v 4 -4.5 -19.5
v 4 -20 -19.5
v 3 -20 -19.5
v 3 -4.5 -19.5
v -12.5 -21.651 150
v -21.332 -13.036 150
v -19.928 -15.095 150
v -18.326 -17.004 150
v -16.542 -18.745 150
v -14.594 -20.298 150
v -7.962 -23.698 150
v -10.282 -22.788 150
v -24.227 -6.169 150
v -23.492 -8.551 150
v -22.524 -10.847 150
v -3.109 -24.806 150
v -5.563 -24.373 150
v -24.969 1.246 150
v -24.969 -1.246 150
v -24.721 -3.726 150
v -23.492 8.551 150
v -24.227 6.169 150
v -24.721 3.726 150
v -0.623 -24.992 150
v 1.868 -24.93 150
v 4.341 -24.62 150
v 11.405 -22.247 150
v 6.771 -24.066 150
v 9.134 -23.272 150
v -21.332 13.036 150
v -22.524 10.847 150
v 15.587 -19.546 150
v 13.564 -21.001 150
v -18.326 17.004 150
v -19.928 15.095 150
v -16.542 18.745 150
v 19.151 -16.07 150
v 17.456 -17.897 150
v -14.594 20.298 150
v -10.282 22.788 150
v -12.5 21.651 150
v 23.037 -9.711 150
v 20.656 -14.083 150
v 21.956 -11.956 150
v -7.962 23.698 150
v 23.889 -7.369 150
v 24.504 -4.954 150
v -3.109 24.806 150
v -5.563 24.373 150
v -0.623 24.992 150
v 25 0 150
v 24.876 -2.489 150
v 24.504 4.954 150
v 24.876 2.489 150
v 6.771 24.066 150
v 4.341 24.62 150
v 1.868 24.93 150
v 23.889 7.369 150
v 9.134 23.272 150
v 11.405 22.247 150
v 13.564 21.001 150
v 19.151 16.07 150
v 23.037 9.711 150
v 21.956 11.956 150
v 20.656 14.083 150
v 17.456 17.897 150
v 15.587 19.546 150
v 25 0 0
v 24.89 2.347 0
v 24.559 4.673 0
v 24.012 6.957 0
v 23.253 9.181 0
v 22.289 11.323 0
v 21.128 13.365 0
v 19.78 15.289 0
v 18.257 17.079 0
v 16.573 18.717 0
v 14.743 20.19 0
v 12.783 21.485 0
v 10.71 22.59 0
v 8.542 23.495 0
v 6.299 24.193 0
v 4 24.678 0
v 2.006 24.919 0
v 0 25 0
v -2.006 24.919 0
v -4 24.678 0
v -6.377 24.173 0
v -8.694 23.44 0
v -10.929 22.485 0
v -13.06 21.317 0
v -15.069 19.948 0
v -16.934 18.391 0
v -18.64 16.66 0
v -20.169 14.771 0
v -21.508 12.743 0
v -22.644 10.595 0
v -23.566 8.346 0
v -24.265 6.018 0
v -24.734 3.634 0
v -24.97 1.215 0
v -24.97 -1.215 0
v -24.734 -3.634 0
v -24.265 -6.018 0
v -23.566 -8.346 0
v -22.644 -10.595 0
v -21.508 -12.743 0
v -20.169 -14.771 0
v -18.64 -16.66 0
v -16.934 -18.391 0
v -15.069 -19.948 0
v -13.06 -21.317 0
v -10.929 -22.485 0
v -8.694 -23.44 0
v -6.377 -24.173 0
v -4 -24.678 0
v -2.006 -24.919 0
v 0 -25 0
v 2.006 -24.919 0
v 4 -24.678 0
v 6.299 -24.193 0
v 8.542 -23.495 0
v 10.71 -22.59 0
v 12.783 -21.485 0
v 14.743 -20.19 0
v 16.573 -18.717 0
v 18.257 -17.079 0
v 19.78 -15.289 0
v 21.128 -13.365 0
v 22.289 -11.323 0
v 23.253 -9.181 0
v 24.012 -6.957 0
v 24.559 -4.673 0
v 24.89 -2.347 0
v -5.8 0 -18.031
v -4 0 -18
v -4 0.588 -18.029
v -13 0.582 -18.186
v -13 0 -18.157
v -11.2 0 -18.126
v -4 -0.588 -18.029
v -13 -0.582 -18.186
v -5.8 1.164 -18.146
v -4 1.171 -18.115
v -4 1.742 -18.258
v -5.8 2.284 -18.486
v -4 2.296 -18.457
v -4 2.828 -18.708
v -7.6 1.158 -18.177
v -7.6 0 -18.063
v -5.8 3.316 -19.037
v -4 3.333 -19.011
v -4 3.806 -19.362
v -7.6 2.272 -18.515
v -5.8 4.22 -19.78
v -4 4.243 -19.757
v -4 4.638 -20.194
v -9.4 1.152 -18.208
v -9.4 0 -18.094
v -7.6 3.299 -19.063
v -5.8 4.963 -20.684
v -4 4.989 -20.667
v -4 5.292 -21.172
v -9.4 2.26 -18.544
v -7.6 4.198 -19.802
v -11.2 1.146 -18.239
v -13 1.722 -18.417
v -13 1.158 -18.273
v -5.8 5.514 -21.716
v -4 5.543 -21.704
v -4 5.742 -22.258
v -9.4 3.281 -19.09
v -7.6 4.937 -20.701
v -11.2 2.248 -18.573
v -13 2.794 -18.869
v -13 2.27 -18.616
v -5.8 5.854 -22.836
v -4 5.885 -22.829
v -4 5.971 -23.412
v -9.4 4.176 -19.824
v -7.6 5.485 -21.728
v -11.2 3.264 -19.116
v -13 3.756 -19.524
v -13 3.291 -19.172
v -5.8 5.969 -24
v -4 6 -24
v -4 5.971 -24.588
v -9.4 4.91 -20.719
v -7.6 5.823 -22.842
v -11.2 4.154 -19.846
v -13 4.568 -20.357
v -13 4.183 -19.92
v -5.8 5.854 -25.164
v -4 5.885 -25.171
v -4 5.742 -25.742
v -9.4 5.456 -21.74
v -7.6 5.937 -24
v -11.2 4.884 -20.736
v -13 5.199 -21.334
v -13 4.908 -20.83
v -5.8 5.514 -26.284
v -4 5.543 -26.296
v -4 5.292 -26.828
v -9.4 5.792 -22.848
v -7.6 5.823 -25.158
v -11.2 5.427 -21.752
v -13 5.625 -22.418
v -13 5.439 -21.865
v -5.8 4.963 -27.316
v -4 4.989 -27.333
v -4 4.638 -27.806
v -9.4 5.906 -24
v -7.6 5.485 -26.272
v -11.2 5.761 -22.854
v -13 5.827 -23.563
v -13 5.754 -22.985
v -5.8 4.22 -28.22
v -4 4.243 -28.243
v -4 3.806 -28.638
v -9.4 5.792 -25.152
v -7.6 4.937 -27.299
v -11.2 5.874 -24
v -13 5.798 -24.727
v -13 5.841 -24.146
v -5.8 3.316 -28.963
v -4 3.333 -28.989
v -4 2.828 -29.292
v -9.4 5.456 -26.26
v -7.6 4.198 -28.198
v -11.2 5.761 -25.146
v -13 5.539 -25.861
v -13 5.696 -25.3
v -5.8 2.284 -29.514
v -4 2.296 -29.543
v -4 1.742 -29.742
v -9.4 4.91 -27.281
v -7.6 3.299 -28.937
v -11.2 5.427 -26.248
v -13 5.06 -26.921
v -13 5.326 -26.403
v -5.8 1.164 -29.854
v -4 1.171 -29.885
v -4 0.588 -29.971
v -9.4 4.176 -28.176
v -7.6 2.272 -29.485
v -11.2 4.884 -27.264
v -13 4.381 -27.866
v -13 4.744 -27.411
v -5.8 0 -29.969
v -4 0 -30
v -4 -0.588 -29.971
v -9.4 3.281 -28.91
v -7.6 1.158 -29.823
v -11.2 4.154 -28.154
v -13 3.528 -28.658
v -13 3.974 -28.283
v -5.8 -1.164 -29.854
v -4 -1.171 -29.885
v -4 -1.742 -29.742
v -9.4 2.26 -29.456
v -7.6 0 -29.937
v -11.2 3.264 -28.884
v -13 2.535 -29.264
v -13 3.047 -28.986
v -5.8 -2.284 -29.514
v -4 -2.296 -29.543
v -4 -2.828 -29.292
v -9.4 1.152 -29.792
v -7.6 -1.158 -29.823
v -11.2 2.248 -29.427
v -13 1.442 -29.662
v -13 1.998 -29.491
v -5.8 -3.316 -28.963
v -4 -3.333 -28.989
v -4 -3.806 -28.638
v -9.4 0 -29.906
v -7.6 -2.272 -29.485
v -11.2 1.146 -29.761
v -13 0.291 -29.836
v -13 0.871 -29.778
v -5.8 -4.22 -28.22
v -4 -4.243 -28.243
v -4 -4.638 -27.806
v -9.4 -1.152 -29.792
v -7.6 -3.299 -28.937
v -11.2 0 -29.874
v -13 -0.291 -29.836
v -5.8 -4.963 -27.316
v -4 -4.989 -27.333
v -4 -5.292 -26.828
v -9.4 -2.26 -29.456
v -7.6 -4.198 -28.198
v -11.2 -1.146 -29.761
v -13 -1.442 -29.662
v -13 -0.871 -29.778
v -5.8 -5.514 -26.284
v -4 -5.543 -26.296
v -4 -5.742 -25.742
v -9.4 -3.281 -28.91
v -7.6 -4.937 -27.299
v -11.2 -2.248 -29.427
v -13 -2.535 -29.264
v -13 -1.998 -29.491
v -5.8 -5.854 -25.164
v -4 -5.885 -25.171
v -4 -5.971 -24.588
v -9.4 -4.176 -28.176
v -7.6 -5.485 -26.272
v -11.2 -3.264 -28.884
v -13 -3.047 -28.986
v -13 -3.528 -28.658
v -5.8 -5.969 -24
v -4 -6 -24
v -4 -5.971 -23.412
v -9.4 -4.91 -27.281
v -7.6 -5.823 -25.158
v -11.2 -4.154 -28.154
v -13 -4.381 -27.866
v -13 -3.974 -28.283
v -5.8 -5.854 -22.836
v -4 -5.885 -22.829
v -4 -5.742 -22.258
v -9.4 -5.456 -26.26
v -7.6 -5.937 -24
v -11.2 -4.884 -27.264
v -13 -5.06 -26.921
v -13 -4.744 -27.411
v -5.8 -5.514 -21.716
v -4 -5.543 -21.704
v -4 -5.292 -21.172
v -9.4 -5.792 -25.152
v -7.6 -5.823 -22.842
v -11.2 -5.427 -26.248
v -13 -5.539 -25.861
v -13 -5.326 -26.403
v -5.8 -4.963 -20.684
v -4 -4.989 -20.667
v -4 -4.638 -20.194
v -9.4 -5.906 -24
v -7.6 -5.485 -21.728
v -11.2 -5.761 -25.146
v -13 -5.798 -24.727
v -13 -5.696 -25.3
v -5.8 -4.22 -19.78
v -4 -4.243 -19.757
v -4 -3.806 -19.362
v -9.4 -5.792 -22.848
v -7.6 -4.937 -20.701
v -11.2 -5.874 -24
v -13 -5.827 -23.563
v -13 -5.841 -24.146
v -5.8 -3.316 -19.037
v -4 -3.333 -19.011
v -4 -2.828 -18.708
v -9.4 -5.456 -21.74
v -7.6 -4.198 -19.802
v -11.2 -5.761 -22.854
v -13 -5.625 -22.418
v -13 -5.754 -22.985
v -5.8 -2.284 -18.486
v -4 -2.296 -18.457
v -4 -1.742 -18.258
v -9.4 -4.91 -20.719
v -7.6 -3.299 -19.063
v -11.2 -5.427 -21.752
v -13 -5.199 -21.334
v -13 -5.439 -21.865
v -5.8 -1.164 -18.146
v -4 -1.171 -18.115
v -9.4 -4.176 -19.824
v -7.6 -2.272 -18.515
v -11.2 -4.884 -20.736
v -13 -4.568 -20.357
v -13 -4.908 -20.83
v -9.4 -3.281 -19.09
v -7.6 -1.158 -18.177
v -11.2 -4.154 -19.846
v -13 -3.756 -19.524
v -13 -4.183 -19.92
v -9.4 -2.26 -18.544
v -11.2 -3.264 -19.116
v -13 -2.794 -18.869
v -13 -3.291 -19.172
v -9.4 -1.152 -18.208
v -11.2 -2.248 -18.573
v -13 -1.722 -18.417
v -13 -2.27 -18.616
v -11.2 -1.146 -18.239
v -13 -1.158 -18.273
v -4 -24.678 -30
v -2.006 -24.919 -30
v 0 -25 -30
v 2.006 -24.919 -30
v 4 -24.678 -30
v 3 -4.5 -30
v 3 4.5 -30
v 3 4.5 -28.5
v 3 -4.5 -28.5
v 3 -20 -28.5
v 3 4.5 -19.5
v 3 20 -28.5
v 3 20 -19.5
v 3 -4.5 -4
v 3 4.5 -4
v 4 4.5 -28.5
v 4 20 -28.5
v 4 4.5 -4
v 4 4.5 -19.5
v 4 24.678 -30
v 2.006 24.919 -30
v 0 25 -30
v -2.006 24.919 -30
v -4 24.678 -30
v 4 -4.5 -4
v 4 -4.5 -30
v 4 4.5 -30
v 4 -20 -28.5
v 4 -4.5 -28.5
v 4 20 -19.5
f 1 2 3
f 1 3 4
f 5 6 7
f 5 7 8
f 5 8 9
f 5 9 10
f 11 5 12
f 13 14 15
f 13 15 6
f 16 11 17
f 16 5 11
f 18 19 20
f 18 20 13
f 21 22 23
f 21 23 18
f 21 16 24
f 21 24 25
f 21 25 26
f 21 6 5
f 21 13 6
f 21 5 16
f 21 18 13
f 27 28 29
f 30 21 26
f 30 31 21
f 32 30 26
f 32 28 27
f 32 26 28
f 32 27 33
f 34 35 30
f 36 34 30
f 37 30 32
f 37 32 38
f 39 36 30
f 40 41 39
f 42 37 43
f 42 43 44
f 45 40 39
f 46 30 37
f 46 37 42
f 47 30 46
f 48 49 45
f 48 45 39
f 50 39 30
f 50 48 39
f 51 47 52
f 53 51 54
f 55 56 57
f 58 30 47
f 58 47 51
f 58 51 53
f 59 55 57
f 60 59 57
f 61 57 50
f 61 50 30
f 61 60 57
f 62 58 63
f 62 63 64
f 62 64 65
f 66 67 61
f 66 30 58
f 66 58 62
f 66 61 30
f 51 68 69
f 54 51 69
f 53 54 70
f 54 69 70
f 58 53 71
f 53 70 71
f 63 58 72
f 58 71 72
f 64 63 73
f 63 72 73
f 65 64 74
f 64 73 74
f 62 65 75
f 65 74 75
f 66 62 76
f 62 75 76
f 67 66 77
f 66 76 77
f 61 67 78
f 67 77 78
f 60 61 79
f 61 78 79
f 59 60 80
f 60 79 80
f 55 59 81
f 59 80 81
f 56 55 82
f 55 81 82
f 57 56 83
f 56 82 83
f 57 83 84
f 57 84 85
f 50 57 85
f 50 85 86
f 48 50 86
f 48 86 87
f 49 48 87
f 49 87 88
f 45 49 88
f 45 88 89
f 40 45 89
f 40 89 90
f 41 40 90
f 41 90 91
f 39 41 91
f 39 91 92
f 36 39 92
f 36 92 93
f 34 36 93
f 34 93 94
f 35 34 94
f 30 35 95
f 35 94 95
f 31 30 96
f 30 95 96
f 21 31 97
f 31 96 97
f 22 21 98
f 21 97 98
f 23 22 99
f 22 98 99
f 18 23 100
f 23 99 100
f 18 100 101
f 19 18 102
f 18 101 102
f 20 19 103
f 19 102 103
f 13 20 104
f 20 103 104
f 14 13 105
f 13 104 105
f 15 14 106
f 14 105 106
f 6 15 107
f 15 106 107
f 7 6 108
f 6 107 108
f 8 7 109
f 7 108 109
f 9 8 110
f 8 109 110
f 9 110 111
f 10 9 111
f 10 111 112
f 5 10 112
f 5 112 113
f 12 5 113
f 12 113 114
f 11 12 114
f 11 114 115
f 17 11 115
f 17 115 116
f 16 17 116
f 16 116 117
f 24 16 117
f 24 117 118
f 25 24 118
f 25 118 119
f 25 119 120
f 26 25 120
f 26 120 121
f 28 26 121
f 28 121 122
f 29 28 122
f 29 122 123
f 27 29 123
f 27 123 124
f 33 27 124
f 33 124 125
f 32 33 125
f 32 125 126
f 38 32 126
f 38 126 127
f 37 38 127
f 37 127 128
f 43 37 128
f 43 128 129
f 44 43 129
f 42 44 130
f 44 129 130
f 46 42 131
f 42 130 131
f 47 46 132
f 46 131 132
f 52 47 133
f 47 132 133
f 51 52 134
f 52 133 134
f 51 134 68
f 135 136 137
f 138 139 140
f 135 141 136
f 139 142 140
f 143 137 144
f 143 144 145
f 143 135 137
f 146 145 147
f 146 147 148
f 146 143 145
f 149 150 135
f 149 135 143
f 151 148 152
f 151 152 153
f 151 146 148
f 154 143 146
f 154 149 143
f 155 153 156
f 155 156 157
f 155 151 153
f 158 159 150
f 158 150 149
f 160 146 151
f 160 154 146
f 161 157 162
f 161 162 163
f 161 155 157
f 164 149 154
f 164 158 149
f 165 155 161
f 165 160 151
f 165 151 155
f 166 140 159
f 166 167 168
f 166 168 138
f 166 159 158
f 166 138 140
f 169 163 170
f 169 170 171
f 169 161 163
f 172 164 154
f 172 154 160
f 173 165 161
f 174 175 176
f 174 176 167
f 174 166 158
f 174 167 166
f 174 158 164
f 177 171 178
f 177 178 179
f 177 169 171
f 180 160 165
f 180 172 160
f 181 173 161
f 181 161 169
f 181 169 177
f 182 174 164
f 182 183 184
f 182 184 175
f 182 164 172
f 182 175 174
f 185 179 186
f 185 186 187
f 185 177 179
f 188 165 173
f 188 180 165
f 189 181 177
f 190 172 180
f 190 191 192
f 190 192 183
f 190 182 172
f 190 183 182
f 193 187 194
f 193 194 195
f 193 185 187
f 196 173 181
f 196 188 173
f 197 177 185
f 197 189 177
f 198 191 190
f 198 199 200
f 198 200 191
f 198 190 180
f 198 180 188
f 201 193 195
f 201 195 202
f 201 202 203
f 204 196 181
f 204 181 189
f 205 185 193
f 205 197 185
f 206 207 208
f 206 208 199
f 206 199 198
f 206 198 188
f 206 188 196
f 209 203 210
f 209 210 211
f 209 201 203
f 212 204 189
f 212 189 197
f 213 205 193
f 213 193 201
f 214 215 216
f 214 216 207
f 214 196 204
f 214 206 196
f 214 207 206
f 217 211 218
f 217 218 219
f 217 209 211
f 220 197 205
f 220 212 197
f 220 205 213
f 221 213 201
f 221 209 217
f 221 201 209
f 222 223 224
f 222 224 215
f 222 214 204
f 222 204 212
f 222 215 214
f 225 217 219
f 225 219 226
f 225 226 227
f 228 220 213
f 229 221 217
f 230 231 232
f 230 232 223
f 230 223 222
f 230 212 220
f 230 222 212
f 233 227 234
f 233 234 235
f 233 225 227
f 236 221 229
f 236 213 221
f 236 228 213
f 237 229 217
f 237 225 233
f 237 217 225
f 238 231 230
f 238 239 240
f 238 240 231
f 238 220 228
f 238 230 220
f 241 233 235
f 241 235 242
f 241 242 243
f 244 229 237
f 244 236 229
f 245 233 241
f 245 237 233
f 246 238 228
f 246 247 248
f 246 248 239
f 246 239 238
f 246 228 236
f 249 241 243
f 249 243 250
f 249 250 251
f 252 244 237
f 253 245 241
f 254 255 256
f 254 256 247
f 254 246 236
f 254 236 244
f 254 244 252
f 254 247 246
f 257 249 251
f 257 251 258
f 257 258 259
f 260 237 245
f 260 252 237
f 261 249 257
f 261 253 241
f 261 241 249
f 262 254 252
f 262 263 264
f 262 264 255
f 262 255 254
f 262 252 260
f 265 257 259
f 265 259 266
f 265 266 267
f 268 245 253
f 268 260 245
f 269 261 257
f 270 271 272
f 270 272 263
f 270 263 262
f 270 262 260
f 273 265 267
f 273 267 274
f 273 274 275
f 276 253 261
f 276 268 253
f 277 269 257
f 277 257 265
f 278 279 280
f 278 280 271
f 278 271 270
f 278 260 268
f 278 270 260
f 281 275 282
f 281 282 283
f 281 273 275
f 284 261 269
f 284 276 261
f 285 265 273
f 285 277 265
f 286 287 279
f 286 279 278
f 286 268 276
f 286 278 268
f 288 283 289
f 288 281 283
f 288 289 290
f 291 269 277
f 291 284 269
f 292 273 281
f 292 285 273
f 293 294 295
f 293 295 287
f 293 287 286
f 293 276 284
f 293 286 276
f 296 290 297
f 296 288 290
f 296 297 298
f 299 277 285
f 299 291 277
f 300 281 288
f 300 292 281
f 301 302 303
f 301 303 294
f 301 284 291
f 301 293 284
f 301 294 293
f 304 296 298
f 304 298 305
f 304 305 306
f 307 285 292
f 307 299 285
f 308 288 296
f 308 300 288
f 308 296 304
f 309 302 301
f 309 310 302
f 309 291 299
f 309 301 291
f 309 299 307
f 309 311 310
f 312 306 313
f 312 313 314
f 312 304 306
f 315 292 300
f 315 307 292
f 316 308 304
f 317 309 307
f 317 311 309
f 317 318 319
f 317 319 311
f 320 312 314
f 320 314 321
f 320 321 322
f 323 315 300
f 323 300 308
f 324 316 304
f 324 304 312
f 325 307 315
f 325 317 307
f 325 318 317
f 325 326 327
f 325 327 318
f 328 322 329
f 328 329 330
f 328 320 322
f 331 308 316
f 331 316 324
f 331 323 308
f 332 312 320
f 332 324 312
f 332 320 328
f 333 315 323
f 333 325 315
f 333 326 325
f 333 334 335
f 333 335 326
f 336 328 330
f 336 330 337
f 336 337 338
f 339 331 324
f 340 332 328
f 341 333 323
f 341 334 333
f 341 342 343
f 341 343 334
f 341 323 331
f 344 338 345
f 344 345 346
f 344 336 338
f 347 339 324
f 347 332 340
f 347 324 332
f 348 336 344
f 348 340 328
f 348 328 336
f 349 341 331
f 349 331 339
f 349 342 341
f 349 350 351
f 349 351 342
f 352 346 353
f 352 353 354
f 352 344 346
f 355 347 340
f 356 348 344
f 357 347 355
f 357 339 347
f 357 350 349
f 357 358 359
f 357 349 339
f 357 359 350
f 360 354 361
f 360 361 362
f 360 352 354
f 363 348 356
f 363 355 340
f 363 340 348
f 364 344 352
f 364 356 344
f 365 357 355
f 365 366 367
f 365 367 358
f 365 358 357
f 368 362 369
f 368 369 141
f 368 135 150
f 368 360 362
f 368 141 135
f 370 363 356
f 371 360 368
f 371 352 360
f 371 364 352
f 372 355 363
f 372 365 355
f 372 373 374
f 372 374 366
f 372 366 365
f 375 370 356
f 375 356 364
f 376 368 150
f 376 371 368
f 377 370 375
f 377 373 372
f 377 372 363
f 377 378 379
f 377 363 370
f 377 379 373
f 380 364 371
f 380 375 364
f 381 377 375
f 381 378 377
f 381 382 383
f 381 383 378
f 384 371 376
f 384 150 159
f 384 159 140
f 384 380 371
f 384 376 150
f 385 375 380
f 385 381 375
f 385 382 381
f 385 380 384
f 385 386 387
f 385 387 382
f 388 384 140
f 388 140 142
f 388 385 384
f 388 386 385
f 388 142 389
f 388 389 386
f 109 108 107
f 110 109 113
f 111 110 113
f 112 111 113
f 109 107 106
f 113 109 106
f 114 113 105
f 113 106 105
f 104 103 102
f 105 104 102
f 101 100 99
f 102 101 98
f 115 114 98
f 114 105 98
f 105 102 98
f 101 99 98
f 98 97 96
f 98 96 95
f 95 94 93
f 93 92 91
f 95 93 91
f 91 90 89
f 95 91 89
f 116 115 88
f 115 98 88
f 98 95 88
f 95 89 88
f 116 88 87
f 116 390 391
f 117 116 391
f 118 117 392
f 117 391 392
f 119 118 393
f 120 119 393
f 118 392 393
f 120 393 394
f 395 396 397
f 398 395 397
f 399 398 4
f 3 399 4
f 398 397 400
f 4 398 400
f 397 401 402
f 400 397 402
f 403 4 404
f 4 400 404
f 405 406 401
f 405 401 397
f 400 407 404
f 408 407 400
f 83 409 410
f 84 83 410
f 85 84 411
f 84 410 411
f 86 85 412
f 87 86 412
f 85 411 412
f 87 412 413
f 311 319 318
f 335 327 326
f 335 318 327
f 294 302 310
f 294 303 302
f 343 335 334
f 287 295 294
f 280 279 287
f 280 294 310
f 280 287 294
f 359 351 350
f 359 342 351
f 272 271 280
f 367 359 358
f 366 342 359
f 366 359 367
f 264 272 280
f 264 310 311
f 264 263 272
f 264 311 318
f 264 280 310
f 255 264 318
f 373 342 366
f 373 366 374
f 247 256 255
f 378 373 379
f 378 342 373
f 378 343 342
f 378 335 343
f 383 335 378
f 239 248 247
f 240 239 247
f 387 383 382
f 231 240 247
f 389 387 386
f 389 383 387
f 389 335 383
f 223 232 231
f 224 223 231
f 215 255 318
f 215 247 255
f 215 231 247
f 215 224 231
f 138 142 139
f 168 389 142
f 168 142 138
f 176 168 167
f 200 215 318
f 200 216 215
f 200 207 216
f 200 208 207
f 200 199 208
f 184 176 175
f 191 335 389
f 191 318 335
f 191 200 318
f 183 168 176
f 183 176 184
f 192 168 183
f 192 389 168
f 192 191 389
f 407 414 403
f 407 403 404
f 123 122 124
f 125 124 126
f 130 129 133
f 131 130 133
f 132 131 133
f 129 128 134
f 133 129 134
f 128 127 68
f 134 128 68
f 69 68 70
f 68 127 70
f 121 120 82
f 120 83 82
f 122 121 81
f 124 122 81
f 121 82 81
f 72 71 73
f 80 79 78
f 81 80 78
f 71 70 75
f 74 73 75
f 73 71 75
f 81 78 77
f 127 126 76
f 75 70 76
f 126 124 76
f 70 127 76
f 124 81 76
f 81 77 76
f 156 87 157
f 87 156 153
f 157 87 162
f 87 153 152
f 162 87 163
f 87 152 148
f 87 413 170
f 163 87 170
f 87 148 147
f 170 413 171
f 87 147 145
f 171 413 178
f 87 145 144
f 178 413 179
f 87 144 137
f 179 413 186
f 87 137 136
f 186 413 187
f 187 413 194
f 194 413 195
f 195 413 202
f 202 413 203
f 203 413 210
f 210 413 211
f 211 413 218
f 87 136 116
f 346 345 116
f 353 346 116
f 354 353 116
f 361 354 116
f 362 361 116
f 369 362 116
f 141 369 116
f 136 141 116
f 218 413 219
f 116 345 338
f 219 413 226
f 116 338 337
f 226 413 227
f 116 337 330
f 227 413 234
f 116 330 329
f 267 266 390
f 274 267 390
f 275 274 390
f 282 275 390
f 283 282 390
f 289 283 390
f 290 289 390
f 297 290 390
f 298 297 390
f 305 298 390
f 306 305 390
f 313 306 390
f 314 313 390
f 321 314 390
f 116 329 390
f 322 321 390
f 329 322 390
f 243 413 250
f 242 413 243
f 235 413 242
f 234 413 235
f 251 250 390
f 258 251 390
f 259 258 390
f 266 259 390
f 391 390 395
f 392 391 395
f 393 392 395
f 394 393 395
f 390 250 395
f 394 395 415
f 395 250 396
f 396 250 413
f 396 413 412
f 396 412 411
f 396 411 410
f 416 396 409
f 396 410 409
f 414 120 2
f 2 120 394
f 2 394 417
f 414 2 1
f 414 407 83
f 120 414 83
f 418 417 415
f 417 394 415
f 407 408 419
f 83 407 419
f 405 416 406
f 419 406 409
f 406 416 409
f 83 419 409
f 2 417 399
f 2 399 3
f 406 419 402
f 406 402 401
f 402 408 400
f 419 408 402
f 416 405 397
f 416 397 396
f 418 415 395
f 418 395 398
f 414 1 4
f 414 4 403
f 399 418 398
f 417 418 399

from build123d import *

# Parameters (mm, degrees)
ESQUISSE1_R             = 25
BOSS_EXTRU_1_DEPTH      = 150
BOSS_EXTRU_2_START      = 30
BOSS_EXTRU_2_DEPTH      = 30
ESQUISSE3_R             = 6
BOSS_EXTRU_3_DEPTH      = 9
BOSS_EXTRU_3_TAPER      = 1
ENL_V_MAT_EXTRU_1_DEPTH = 1


with BuildPart() as part:
    # Esquisse1 → Boss.-Extru.1 (new body)
    with BuildSketch(Plane.XY):
        Circle(ESQUISSE1_R)
    extrude(amount=BOSS_EXTRU_1_DEPTH)

    # Esquisse2 → Boss.-Extru.2 (add)
    with BuildSketch(Plane(origin=(0, 0, 0), x_dir=(-1, 0, 0), z_dir=(0, 0, -1)).offset(BOSS_EXTRU_2_START)):
        with BuildLine():
            Line((-4, -24.677925359), (-4, 24.677925359))
            ThreePointArc((-4, 24.677925359), (0, 25), (4, 24.677925359))
            Line((4, 24.677925359), (4, -24.677925359))
            ThreePointArc((4, -24.677925359), (0, -25), (-4, -24.677925359))
        make_face()
    extrude(amount=-BOSS_EXTRU_2_DEPTH)

    # Esquisse3 → Boss.-Extru.3 (add)
    with BuildSketch(Plane.ZY.offset(4)):
        with Locations((-24, 0)):
            Circle(ESQUISSE3_R)
    extrude(amount=BOSS_EXTRU_3_DEPTH, taper=BOSS_EXTRU_3_TAPER)

    # Esquisse4 → Enlèv. mat.-Extru.1 (cut)
    with BuildSketch(Plane(origin=(4, 0, 0), x_dir=(0, 0, -1), z_dir=(1, 0, 0))):
        Polygon((19.5, 4.5), (19.5, 20), (28.5, 20), (28.5, 4.5), (30, 4.5), (30, -4.5), (28.5, -4.5), (28.5, -20), (19.5, -20), (19.5, -4.5), (4, -4.5), (4, 4.5), align=None)
    extrude(amount=-ENL_V_MAT_EXTRU_1_DEPTH, mode=Mode.SUBTRACT)


solid = part.part
